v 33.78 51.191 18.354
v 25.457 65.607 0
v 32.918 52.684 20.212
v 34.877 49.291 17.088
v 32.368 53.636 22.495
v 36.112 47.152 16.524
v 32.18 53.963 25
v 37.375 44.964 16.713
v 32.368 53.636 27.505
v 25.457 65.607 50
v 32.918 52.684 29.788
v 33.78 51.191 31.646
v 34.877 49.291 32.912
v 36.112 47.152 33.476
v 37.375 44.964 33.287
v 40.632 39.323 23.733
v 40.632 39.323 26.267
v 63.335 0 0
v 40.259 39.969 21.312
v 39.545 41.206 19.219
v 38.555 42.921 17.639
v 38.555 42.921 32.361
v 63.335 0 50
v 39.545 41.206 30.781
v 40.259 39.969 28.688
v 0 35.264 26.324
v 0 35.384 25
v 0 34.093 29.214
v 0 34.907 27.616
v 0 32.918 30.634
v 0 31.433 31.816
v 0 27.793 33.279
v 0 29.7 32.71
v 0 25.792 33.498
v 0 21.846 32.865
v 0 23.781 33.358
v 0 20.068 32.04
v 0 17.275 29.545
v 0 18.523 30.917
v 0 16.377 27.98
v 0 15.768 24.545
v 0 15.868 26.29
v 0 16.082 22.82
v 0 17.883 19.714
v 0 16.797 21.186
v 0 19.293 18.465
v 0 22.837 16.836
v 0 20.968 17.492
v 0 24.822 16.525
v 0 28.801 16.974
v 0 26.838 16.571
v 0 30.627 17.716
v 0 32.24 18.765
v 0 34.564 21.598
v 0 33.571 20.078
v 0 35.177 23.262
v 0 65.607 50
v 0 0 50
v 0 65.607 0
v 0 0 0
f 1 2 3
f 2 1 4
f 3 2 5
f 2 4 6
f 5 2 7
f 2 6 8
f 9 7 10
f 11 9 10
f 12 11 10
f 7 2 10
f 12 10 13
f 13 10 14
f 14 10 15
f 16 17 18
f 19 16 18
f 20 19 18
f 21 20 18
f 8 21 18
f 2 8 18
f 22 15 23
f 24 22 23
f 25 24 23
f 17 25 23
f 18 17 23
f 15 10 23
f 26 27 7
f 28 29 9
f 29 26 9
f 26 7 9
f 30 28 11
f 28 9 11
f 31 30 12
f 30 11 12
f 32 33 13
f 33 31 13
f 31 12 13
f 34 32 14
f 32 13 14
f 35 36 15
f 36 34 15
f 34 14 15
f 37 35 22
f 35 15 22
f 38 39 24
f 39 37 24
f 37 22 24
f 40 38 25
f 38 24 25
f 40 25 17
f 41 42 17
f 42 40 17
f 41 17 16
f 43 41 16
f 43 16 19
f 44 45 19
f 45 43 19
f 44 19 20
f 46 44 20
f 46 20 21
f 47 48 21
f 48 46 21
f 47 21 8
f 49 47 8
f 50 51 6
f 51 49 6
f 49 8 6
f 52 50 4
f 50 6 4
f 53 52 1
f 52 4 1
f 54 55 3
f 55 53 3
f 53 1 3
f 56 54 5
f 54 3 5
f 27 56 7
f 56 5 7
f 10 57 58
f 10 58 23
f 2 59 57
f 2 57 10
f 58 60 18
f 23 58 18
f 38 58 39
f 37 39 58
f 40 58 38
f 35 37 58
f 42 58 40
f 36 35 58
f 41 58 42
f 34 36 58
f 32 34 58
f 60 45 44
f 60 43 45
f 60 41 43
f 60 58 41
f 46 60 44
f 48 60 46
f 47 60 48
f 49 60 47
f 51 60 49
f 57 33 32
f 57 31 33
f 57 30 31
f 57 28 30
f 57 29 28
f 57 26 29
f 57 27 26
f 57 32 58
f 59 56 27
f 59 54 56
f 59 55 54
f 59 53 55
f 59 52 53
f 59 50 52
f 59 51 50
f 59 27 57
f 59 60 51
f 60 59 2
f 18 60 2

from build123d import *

# Parameters (mm, degrees)
SKETCH1_W           = 63.335064935
SKETCH1_H           = 65.606575703
BOSS_EXTRUDE1_DEPTH = 50
CUT_EXTRUDE1_DEPTH  = 50
CUT_EXTRUDE2_REACH  = 80.83
SKETCH3_R           = 8.5


with BuildPart() as part:
    # Sketch1 → Boss-Extrude1 (new body)
    with BuildSketch(Plane.XY):
        with Locations((31.667532468, 32.803287852)):
            Rectangle(SKETCH1_W, SKETCH1_H)
    extrude(amount=BOSS_EXTRUDE1_DEPTH)

    # Sketch2 → Cut-Extrude1 (cut)
    with BuildSketch(Plane.XY.offset(50)):
        Polygon((25.457090792, 65.606575703), (63.335064935, 0), (63.335064935, 65.606575703), align=None)
    extrude(amount=-CUT_EXTRUDE1_DEPTH, mode=Mode.SUBTRACT)

    # Cut-Extrude2: up to this plane
    cut_extrude2_end = Plane(origin=(0, 0, 50), z_dir=(-1, 0, 0))
    # Sketch3 → Cut-Extrude2 (cut, up to the surface)
    with BuildSketch(Plane(origin=(47.501298701, 27.424887592, 0), x_dir=(0, 0, -1), z_dir=(0.866025403784436, 0.5000000000000043, 0)), mode=Mode.PRIVATE) as cut_extrude2_sk1:
        with Locations(Location((-25, 22.143442983, 0), (0, 0, 90))):
            Circle(SKETCH3_R)
    cut_extrude2_tool1 = split(extrude(cut_extrude2_sk1.sketch, amount=-CUT_EXTRUDE2_REACH, mode=Mode.PRIVATE), bisect_by=cut_extrude2_end, keep=Keep.BOTH, mode=Mode.PRIVATE)
    add(cut_extrude2_tool1.solids().sort_by_distance((36.429577, 46.601672, 25))[0], mode=Mode.SUBTRACT)


solid = part.part
